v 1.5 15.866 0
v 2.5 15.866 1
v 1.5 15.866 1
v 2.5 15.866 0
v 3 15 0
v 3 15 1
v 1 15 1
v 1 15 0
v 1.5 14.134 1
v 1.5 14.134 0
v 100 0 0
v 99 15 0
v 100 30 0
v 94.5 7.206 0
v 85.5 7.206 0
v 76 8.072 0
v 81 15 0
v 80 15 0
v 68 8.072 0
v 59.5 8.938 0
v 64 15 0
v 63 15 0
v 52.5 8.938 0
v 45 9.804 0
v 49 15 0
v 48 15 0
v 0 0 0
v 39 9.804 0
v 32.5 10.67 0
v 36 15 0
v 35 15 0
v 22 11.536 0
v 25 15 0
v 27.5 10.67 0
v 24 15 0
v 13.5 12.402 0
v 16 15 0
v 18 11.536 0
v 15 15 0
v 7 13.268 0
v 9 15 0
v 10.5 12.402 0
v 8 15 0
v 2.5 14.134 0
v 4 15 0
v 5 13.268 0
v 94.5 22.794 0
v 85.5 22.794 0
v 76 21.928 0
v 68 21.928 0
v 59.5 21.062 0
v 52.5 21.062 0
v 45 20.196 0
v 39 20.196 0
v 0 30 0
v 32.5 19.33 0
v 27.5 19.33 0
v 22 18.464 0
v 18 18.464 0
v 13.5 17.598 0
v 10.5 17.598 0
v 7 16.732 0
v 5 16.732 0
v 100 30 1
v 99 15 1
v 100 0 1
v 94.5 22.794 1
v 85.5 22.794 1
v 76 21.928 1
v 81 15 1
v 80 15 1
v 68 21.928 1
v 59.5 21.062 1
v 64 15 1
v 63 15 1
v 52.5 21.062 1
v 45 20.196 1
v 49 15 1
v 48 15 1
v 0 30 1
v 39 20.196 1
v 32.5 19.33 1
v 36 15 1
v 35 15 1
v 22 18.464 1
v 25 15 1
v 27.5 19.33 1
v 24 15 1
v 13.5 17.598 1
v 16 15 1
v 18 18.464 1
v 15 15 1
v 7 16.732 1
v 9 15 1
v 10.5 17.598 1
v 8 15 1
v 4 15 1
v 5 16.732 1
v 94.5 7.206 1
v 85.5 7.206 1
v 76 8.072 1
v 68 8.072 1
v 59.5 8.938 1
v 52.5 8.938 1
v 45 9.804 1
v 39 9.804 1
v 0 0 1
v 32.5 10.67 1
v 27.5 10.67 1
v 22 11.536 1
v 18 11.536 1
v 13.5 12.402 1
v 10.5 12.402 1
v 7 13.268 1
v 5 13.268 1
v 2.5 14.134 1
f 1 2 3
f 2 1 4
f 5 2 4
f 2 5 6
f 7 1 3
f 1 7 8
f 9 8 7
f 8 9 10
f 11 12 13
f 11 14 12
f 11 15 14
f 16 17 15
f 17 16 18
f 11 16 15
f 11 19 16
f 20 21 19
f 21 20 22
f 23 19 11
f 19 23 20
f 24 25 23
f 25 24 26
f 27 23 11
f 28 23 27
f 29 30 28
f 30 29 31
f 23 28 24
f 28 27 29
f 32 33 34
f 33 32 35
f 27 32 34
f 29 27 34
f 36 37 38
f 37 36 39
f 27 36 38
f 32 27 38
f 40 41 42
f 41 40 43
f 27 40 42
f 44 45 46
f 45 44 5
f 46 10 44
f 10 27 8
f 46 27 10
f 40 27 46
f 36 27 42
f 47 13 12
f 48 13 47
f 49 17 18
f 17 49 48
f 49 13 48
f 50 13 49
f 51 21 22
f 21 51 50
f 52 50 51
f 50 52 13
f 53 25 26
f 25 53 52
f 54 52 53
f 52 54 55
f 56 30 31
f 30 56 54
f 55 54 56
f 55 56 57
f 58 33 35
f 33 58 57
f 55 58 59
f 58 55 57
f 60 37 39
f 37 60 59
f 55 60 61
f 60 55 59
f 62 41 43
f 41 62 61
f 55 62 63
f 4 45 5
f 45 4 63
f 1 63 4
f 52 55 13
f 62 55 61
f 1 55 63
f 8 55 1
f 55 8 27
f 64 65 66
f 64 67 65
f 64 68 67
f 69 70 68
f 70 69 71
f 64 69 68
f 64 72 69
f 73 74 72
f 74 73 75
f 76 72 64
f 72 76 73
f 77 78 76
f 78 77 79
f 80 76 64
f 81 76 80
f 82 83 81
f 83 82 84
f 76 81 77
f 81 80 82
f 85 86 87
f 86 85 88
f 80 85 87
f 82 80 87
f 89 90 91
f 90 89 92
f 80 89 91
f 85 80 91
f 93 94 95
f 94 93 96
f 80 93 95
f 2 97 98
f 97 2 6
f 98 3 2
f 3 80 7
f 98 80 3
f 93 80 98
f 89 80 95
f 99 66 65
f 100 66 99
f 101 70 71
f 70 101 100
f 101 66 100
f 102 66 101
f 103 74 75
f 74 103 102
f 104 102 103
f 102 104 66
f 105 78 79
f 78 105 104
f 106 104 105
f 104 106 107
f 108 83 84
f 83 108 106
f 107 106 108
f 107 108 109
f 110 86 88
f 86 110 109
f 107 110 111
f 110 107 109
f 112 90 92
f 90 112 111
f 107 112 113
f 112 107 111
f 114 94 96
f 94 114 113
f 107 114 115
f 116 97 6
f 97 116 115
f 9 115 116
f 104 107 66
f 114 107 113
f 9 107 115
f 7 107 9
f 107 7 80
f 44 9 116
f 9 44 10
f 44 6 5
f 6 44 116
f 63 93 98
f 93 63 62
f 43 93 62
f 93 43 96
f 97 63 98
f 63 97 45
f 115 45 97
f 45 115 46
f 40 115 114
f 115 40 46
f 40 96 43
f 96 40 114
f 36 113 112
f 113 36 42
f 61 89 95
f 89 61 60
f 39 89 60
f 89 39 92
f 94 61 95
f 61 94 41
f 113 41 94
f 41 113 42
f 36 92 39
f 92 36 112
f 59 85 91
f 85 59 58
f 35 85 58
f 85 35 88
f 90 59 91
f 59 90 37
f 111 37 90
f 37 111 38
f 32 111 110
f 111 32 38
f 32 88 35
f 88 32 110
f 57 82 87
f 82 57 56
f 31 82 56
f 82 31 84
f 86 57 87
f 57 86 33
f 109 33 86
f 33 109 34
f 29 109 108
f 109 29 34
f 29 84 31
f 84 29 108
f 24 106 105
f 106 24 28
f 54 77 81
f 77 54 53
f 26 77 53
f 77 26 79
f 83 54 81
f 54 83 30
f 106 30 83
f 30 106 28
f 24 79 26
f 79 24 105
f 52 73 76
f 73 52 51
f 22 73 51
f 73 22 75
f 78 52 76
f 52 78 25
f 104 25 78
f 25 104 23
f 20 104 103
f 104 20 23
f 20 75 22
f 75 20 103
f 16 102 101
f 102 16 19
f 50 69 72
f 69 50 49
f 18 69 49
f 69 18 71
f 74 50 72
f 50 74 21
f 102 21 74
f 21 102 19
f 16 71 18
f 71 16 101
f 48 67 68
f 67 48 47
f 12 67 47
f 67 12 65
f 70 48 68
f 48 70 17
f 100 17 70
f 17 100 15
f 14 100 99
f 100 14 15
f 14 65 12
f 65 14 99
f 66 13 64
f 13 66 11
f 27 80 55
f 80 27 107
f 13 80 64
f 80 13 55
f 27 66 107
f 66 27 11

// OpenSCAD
h = 1;
gap = 1;

difference() {
    cube([100, 30, h]);
    for (i=[0:9]) {
        translate([i*i + gap * i, 15, 0])
            cylinder(h=h, r1=i, r2=i, $fn=6);
    }
}
